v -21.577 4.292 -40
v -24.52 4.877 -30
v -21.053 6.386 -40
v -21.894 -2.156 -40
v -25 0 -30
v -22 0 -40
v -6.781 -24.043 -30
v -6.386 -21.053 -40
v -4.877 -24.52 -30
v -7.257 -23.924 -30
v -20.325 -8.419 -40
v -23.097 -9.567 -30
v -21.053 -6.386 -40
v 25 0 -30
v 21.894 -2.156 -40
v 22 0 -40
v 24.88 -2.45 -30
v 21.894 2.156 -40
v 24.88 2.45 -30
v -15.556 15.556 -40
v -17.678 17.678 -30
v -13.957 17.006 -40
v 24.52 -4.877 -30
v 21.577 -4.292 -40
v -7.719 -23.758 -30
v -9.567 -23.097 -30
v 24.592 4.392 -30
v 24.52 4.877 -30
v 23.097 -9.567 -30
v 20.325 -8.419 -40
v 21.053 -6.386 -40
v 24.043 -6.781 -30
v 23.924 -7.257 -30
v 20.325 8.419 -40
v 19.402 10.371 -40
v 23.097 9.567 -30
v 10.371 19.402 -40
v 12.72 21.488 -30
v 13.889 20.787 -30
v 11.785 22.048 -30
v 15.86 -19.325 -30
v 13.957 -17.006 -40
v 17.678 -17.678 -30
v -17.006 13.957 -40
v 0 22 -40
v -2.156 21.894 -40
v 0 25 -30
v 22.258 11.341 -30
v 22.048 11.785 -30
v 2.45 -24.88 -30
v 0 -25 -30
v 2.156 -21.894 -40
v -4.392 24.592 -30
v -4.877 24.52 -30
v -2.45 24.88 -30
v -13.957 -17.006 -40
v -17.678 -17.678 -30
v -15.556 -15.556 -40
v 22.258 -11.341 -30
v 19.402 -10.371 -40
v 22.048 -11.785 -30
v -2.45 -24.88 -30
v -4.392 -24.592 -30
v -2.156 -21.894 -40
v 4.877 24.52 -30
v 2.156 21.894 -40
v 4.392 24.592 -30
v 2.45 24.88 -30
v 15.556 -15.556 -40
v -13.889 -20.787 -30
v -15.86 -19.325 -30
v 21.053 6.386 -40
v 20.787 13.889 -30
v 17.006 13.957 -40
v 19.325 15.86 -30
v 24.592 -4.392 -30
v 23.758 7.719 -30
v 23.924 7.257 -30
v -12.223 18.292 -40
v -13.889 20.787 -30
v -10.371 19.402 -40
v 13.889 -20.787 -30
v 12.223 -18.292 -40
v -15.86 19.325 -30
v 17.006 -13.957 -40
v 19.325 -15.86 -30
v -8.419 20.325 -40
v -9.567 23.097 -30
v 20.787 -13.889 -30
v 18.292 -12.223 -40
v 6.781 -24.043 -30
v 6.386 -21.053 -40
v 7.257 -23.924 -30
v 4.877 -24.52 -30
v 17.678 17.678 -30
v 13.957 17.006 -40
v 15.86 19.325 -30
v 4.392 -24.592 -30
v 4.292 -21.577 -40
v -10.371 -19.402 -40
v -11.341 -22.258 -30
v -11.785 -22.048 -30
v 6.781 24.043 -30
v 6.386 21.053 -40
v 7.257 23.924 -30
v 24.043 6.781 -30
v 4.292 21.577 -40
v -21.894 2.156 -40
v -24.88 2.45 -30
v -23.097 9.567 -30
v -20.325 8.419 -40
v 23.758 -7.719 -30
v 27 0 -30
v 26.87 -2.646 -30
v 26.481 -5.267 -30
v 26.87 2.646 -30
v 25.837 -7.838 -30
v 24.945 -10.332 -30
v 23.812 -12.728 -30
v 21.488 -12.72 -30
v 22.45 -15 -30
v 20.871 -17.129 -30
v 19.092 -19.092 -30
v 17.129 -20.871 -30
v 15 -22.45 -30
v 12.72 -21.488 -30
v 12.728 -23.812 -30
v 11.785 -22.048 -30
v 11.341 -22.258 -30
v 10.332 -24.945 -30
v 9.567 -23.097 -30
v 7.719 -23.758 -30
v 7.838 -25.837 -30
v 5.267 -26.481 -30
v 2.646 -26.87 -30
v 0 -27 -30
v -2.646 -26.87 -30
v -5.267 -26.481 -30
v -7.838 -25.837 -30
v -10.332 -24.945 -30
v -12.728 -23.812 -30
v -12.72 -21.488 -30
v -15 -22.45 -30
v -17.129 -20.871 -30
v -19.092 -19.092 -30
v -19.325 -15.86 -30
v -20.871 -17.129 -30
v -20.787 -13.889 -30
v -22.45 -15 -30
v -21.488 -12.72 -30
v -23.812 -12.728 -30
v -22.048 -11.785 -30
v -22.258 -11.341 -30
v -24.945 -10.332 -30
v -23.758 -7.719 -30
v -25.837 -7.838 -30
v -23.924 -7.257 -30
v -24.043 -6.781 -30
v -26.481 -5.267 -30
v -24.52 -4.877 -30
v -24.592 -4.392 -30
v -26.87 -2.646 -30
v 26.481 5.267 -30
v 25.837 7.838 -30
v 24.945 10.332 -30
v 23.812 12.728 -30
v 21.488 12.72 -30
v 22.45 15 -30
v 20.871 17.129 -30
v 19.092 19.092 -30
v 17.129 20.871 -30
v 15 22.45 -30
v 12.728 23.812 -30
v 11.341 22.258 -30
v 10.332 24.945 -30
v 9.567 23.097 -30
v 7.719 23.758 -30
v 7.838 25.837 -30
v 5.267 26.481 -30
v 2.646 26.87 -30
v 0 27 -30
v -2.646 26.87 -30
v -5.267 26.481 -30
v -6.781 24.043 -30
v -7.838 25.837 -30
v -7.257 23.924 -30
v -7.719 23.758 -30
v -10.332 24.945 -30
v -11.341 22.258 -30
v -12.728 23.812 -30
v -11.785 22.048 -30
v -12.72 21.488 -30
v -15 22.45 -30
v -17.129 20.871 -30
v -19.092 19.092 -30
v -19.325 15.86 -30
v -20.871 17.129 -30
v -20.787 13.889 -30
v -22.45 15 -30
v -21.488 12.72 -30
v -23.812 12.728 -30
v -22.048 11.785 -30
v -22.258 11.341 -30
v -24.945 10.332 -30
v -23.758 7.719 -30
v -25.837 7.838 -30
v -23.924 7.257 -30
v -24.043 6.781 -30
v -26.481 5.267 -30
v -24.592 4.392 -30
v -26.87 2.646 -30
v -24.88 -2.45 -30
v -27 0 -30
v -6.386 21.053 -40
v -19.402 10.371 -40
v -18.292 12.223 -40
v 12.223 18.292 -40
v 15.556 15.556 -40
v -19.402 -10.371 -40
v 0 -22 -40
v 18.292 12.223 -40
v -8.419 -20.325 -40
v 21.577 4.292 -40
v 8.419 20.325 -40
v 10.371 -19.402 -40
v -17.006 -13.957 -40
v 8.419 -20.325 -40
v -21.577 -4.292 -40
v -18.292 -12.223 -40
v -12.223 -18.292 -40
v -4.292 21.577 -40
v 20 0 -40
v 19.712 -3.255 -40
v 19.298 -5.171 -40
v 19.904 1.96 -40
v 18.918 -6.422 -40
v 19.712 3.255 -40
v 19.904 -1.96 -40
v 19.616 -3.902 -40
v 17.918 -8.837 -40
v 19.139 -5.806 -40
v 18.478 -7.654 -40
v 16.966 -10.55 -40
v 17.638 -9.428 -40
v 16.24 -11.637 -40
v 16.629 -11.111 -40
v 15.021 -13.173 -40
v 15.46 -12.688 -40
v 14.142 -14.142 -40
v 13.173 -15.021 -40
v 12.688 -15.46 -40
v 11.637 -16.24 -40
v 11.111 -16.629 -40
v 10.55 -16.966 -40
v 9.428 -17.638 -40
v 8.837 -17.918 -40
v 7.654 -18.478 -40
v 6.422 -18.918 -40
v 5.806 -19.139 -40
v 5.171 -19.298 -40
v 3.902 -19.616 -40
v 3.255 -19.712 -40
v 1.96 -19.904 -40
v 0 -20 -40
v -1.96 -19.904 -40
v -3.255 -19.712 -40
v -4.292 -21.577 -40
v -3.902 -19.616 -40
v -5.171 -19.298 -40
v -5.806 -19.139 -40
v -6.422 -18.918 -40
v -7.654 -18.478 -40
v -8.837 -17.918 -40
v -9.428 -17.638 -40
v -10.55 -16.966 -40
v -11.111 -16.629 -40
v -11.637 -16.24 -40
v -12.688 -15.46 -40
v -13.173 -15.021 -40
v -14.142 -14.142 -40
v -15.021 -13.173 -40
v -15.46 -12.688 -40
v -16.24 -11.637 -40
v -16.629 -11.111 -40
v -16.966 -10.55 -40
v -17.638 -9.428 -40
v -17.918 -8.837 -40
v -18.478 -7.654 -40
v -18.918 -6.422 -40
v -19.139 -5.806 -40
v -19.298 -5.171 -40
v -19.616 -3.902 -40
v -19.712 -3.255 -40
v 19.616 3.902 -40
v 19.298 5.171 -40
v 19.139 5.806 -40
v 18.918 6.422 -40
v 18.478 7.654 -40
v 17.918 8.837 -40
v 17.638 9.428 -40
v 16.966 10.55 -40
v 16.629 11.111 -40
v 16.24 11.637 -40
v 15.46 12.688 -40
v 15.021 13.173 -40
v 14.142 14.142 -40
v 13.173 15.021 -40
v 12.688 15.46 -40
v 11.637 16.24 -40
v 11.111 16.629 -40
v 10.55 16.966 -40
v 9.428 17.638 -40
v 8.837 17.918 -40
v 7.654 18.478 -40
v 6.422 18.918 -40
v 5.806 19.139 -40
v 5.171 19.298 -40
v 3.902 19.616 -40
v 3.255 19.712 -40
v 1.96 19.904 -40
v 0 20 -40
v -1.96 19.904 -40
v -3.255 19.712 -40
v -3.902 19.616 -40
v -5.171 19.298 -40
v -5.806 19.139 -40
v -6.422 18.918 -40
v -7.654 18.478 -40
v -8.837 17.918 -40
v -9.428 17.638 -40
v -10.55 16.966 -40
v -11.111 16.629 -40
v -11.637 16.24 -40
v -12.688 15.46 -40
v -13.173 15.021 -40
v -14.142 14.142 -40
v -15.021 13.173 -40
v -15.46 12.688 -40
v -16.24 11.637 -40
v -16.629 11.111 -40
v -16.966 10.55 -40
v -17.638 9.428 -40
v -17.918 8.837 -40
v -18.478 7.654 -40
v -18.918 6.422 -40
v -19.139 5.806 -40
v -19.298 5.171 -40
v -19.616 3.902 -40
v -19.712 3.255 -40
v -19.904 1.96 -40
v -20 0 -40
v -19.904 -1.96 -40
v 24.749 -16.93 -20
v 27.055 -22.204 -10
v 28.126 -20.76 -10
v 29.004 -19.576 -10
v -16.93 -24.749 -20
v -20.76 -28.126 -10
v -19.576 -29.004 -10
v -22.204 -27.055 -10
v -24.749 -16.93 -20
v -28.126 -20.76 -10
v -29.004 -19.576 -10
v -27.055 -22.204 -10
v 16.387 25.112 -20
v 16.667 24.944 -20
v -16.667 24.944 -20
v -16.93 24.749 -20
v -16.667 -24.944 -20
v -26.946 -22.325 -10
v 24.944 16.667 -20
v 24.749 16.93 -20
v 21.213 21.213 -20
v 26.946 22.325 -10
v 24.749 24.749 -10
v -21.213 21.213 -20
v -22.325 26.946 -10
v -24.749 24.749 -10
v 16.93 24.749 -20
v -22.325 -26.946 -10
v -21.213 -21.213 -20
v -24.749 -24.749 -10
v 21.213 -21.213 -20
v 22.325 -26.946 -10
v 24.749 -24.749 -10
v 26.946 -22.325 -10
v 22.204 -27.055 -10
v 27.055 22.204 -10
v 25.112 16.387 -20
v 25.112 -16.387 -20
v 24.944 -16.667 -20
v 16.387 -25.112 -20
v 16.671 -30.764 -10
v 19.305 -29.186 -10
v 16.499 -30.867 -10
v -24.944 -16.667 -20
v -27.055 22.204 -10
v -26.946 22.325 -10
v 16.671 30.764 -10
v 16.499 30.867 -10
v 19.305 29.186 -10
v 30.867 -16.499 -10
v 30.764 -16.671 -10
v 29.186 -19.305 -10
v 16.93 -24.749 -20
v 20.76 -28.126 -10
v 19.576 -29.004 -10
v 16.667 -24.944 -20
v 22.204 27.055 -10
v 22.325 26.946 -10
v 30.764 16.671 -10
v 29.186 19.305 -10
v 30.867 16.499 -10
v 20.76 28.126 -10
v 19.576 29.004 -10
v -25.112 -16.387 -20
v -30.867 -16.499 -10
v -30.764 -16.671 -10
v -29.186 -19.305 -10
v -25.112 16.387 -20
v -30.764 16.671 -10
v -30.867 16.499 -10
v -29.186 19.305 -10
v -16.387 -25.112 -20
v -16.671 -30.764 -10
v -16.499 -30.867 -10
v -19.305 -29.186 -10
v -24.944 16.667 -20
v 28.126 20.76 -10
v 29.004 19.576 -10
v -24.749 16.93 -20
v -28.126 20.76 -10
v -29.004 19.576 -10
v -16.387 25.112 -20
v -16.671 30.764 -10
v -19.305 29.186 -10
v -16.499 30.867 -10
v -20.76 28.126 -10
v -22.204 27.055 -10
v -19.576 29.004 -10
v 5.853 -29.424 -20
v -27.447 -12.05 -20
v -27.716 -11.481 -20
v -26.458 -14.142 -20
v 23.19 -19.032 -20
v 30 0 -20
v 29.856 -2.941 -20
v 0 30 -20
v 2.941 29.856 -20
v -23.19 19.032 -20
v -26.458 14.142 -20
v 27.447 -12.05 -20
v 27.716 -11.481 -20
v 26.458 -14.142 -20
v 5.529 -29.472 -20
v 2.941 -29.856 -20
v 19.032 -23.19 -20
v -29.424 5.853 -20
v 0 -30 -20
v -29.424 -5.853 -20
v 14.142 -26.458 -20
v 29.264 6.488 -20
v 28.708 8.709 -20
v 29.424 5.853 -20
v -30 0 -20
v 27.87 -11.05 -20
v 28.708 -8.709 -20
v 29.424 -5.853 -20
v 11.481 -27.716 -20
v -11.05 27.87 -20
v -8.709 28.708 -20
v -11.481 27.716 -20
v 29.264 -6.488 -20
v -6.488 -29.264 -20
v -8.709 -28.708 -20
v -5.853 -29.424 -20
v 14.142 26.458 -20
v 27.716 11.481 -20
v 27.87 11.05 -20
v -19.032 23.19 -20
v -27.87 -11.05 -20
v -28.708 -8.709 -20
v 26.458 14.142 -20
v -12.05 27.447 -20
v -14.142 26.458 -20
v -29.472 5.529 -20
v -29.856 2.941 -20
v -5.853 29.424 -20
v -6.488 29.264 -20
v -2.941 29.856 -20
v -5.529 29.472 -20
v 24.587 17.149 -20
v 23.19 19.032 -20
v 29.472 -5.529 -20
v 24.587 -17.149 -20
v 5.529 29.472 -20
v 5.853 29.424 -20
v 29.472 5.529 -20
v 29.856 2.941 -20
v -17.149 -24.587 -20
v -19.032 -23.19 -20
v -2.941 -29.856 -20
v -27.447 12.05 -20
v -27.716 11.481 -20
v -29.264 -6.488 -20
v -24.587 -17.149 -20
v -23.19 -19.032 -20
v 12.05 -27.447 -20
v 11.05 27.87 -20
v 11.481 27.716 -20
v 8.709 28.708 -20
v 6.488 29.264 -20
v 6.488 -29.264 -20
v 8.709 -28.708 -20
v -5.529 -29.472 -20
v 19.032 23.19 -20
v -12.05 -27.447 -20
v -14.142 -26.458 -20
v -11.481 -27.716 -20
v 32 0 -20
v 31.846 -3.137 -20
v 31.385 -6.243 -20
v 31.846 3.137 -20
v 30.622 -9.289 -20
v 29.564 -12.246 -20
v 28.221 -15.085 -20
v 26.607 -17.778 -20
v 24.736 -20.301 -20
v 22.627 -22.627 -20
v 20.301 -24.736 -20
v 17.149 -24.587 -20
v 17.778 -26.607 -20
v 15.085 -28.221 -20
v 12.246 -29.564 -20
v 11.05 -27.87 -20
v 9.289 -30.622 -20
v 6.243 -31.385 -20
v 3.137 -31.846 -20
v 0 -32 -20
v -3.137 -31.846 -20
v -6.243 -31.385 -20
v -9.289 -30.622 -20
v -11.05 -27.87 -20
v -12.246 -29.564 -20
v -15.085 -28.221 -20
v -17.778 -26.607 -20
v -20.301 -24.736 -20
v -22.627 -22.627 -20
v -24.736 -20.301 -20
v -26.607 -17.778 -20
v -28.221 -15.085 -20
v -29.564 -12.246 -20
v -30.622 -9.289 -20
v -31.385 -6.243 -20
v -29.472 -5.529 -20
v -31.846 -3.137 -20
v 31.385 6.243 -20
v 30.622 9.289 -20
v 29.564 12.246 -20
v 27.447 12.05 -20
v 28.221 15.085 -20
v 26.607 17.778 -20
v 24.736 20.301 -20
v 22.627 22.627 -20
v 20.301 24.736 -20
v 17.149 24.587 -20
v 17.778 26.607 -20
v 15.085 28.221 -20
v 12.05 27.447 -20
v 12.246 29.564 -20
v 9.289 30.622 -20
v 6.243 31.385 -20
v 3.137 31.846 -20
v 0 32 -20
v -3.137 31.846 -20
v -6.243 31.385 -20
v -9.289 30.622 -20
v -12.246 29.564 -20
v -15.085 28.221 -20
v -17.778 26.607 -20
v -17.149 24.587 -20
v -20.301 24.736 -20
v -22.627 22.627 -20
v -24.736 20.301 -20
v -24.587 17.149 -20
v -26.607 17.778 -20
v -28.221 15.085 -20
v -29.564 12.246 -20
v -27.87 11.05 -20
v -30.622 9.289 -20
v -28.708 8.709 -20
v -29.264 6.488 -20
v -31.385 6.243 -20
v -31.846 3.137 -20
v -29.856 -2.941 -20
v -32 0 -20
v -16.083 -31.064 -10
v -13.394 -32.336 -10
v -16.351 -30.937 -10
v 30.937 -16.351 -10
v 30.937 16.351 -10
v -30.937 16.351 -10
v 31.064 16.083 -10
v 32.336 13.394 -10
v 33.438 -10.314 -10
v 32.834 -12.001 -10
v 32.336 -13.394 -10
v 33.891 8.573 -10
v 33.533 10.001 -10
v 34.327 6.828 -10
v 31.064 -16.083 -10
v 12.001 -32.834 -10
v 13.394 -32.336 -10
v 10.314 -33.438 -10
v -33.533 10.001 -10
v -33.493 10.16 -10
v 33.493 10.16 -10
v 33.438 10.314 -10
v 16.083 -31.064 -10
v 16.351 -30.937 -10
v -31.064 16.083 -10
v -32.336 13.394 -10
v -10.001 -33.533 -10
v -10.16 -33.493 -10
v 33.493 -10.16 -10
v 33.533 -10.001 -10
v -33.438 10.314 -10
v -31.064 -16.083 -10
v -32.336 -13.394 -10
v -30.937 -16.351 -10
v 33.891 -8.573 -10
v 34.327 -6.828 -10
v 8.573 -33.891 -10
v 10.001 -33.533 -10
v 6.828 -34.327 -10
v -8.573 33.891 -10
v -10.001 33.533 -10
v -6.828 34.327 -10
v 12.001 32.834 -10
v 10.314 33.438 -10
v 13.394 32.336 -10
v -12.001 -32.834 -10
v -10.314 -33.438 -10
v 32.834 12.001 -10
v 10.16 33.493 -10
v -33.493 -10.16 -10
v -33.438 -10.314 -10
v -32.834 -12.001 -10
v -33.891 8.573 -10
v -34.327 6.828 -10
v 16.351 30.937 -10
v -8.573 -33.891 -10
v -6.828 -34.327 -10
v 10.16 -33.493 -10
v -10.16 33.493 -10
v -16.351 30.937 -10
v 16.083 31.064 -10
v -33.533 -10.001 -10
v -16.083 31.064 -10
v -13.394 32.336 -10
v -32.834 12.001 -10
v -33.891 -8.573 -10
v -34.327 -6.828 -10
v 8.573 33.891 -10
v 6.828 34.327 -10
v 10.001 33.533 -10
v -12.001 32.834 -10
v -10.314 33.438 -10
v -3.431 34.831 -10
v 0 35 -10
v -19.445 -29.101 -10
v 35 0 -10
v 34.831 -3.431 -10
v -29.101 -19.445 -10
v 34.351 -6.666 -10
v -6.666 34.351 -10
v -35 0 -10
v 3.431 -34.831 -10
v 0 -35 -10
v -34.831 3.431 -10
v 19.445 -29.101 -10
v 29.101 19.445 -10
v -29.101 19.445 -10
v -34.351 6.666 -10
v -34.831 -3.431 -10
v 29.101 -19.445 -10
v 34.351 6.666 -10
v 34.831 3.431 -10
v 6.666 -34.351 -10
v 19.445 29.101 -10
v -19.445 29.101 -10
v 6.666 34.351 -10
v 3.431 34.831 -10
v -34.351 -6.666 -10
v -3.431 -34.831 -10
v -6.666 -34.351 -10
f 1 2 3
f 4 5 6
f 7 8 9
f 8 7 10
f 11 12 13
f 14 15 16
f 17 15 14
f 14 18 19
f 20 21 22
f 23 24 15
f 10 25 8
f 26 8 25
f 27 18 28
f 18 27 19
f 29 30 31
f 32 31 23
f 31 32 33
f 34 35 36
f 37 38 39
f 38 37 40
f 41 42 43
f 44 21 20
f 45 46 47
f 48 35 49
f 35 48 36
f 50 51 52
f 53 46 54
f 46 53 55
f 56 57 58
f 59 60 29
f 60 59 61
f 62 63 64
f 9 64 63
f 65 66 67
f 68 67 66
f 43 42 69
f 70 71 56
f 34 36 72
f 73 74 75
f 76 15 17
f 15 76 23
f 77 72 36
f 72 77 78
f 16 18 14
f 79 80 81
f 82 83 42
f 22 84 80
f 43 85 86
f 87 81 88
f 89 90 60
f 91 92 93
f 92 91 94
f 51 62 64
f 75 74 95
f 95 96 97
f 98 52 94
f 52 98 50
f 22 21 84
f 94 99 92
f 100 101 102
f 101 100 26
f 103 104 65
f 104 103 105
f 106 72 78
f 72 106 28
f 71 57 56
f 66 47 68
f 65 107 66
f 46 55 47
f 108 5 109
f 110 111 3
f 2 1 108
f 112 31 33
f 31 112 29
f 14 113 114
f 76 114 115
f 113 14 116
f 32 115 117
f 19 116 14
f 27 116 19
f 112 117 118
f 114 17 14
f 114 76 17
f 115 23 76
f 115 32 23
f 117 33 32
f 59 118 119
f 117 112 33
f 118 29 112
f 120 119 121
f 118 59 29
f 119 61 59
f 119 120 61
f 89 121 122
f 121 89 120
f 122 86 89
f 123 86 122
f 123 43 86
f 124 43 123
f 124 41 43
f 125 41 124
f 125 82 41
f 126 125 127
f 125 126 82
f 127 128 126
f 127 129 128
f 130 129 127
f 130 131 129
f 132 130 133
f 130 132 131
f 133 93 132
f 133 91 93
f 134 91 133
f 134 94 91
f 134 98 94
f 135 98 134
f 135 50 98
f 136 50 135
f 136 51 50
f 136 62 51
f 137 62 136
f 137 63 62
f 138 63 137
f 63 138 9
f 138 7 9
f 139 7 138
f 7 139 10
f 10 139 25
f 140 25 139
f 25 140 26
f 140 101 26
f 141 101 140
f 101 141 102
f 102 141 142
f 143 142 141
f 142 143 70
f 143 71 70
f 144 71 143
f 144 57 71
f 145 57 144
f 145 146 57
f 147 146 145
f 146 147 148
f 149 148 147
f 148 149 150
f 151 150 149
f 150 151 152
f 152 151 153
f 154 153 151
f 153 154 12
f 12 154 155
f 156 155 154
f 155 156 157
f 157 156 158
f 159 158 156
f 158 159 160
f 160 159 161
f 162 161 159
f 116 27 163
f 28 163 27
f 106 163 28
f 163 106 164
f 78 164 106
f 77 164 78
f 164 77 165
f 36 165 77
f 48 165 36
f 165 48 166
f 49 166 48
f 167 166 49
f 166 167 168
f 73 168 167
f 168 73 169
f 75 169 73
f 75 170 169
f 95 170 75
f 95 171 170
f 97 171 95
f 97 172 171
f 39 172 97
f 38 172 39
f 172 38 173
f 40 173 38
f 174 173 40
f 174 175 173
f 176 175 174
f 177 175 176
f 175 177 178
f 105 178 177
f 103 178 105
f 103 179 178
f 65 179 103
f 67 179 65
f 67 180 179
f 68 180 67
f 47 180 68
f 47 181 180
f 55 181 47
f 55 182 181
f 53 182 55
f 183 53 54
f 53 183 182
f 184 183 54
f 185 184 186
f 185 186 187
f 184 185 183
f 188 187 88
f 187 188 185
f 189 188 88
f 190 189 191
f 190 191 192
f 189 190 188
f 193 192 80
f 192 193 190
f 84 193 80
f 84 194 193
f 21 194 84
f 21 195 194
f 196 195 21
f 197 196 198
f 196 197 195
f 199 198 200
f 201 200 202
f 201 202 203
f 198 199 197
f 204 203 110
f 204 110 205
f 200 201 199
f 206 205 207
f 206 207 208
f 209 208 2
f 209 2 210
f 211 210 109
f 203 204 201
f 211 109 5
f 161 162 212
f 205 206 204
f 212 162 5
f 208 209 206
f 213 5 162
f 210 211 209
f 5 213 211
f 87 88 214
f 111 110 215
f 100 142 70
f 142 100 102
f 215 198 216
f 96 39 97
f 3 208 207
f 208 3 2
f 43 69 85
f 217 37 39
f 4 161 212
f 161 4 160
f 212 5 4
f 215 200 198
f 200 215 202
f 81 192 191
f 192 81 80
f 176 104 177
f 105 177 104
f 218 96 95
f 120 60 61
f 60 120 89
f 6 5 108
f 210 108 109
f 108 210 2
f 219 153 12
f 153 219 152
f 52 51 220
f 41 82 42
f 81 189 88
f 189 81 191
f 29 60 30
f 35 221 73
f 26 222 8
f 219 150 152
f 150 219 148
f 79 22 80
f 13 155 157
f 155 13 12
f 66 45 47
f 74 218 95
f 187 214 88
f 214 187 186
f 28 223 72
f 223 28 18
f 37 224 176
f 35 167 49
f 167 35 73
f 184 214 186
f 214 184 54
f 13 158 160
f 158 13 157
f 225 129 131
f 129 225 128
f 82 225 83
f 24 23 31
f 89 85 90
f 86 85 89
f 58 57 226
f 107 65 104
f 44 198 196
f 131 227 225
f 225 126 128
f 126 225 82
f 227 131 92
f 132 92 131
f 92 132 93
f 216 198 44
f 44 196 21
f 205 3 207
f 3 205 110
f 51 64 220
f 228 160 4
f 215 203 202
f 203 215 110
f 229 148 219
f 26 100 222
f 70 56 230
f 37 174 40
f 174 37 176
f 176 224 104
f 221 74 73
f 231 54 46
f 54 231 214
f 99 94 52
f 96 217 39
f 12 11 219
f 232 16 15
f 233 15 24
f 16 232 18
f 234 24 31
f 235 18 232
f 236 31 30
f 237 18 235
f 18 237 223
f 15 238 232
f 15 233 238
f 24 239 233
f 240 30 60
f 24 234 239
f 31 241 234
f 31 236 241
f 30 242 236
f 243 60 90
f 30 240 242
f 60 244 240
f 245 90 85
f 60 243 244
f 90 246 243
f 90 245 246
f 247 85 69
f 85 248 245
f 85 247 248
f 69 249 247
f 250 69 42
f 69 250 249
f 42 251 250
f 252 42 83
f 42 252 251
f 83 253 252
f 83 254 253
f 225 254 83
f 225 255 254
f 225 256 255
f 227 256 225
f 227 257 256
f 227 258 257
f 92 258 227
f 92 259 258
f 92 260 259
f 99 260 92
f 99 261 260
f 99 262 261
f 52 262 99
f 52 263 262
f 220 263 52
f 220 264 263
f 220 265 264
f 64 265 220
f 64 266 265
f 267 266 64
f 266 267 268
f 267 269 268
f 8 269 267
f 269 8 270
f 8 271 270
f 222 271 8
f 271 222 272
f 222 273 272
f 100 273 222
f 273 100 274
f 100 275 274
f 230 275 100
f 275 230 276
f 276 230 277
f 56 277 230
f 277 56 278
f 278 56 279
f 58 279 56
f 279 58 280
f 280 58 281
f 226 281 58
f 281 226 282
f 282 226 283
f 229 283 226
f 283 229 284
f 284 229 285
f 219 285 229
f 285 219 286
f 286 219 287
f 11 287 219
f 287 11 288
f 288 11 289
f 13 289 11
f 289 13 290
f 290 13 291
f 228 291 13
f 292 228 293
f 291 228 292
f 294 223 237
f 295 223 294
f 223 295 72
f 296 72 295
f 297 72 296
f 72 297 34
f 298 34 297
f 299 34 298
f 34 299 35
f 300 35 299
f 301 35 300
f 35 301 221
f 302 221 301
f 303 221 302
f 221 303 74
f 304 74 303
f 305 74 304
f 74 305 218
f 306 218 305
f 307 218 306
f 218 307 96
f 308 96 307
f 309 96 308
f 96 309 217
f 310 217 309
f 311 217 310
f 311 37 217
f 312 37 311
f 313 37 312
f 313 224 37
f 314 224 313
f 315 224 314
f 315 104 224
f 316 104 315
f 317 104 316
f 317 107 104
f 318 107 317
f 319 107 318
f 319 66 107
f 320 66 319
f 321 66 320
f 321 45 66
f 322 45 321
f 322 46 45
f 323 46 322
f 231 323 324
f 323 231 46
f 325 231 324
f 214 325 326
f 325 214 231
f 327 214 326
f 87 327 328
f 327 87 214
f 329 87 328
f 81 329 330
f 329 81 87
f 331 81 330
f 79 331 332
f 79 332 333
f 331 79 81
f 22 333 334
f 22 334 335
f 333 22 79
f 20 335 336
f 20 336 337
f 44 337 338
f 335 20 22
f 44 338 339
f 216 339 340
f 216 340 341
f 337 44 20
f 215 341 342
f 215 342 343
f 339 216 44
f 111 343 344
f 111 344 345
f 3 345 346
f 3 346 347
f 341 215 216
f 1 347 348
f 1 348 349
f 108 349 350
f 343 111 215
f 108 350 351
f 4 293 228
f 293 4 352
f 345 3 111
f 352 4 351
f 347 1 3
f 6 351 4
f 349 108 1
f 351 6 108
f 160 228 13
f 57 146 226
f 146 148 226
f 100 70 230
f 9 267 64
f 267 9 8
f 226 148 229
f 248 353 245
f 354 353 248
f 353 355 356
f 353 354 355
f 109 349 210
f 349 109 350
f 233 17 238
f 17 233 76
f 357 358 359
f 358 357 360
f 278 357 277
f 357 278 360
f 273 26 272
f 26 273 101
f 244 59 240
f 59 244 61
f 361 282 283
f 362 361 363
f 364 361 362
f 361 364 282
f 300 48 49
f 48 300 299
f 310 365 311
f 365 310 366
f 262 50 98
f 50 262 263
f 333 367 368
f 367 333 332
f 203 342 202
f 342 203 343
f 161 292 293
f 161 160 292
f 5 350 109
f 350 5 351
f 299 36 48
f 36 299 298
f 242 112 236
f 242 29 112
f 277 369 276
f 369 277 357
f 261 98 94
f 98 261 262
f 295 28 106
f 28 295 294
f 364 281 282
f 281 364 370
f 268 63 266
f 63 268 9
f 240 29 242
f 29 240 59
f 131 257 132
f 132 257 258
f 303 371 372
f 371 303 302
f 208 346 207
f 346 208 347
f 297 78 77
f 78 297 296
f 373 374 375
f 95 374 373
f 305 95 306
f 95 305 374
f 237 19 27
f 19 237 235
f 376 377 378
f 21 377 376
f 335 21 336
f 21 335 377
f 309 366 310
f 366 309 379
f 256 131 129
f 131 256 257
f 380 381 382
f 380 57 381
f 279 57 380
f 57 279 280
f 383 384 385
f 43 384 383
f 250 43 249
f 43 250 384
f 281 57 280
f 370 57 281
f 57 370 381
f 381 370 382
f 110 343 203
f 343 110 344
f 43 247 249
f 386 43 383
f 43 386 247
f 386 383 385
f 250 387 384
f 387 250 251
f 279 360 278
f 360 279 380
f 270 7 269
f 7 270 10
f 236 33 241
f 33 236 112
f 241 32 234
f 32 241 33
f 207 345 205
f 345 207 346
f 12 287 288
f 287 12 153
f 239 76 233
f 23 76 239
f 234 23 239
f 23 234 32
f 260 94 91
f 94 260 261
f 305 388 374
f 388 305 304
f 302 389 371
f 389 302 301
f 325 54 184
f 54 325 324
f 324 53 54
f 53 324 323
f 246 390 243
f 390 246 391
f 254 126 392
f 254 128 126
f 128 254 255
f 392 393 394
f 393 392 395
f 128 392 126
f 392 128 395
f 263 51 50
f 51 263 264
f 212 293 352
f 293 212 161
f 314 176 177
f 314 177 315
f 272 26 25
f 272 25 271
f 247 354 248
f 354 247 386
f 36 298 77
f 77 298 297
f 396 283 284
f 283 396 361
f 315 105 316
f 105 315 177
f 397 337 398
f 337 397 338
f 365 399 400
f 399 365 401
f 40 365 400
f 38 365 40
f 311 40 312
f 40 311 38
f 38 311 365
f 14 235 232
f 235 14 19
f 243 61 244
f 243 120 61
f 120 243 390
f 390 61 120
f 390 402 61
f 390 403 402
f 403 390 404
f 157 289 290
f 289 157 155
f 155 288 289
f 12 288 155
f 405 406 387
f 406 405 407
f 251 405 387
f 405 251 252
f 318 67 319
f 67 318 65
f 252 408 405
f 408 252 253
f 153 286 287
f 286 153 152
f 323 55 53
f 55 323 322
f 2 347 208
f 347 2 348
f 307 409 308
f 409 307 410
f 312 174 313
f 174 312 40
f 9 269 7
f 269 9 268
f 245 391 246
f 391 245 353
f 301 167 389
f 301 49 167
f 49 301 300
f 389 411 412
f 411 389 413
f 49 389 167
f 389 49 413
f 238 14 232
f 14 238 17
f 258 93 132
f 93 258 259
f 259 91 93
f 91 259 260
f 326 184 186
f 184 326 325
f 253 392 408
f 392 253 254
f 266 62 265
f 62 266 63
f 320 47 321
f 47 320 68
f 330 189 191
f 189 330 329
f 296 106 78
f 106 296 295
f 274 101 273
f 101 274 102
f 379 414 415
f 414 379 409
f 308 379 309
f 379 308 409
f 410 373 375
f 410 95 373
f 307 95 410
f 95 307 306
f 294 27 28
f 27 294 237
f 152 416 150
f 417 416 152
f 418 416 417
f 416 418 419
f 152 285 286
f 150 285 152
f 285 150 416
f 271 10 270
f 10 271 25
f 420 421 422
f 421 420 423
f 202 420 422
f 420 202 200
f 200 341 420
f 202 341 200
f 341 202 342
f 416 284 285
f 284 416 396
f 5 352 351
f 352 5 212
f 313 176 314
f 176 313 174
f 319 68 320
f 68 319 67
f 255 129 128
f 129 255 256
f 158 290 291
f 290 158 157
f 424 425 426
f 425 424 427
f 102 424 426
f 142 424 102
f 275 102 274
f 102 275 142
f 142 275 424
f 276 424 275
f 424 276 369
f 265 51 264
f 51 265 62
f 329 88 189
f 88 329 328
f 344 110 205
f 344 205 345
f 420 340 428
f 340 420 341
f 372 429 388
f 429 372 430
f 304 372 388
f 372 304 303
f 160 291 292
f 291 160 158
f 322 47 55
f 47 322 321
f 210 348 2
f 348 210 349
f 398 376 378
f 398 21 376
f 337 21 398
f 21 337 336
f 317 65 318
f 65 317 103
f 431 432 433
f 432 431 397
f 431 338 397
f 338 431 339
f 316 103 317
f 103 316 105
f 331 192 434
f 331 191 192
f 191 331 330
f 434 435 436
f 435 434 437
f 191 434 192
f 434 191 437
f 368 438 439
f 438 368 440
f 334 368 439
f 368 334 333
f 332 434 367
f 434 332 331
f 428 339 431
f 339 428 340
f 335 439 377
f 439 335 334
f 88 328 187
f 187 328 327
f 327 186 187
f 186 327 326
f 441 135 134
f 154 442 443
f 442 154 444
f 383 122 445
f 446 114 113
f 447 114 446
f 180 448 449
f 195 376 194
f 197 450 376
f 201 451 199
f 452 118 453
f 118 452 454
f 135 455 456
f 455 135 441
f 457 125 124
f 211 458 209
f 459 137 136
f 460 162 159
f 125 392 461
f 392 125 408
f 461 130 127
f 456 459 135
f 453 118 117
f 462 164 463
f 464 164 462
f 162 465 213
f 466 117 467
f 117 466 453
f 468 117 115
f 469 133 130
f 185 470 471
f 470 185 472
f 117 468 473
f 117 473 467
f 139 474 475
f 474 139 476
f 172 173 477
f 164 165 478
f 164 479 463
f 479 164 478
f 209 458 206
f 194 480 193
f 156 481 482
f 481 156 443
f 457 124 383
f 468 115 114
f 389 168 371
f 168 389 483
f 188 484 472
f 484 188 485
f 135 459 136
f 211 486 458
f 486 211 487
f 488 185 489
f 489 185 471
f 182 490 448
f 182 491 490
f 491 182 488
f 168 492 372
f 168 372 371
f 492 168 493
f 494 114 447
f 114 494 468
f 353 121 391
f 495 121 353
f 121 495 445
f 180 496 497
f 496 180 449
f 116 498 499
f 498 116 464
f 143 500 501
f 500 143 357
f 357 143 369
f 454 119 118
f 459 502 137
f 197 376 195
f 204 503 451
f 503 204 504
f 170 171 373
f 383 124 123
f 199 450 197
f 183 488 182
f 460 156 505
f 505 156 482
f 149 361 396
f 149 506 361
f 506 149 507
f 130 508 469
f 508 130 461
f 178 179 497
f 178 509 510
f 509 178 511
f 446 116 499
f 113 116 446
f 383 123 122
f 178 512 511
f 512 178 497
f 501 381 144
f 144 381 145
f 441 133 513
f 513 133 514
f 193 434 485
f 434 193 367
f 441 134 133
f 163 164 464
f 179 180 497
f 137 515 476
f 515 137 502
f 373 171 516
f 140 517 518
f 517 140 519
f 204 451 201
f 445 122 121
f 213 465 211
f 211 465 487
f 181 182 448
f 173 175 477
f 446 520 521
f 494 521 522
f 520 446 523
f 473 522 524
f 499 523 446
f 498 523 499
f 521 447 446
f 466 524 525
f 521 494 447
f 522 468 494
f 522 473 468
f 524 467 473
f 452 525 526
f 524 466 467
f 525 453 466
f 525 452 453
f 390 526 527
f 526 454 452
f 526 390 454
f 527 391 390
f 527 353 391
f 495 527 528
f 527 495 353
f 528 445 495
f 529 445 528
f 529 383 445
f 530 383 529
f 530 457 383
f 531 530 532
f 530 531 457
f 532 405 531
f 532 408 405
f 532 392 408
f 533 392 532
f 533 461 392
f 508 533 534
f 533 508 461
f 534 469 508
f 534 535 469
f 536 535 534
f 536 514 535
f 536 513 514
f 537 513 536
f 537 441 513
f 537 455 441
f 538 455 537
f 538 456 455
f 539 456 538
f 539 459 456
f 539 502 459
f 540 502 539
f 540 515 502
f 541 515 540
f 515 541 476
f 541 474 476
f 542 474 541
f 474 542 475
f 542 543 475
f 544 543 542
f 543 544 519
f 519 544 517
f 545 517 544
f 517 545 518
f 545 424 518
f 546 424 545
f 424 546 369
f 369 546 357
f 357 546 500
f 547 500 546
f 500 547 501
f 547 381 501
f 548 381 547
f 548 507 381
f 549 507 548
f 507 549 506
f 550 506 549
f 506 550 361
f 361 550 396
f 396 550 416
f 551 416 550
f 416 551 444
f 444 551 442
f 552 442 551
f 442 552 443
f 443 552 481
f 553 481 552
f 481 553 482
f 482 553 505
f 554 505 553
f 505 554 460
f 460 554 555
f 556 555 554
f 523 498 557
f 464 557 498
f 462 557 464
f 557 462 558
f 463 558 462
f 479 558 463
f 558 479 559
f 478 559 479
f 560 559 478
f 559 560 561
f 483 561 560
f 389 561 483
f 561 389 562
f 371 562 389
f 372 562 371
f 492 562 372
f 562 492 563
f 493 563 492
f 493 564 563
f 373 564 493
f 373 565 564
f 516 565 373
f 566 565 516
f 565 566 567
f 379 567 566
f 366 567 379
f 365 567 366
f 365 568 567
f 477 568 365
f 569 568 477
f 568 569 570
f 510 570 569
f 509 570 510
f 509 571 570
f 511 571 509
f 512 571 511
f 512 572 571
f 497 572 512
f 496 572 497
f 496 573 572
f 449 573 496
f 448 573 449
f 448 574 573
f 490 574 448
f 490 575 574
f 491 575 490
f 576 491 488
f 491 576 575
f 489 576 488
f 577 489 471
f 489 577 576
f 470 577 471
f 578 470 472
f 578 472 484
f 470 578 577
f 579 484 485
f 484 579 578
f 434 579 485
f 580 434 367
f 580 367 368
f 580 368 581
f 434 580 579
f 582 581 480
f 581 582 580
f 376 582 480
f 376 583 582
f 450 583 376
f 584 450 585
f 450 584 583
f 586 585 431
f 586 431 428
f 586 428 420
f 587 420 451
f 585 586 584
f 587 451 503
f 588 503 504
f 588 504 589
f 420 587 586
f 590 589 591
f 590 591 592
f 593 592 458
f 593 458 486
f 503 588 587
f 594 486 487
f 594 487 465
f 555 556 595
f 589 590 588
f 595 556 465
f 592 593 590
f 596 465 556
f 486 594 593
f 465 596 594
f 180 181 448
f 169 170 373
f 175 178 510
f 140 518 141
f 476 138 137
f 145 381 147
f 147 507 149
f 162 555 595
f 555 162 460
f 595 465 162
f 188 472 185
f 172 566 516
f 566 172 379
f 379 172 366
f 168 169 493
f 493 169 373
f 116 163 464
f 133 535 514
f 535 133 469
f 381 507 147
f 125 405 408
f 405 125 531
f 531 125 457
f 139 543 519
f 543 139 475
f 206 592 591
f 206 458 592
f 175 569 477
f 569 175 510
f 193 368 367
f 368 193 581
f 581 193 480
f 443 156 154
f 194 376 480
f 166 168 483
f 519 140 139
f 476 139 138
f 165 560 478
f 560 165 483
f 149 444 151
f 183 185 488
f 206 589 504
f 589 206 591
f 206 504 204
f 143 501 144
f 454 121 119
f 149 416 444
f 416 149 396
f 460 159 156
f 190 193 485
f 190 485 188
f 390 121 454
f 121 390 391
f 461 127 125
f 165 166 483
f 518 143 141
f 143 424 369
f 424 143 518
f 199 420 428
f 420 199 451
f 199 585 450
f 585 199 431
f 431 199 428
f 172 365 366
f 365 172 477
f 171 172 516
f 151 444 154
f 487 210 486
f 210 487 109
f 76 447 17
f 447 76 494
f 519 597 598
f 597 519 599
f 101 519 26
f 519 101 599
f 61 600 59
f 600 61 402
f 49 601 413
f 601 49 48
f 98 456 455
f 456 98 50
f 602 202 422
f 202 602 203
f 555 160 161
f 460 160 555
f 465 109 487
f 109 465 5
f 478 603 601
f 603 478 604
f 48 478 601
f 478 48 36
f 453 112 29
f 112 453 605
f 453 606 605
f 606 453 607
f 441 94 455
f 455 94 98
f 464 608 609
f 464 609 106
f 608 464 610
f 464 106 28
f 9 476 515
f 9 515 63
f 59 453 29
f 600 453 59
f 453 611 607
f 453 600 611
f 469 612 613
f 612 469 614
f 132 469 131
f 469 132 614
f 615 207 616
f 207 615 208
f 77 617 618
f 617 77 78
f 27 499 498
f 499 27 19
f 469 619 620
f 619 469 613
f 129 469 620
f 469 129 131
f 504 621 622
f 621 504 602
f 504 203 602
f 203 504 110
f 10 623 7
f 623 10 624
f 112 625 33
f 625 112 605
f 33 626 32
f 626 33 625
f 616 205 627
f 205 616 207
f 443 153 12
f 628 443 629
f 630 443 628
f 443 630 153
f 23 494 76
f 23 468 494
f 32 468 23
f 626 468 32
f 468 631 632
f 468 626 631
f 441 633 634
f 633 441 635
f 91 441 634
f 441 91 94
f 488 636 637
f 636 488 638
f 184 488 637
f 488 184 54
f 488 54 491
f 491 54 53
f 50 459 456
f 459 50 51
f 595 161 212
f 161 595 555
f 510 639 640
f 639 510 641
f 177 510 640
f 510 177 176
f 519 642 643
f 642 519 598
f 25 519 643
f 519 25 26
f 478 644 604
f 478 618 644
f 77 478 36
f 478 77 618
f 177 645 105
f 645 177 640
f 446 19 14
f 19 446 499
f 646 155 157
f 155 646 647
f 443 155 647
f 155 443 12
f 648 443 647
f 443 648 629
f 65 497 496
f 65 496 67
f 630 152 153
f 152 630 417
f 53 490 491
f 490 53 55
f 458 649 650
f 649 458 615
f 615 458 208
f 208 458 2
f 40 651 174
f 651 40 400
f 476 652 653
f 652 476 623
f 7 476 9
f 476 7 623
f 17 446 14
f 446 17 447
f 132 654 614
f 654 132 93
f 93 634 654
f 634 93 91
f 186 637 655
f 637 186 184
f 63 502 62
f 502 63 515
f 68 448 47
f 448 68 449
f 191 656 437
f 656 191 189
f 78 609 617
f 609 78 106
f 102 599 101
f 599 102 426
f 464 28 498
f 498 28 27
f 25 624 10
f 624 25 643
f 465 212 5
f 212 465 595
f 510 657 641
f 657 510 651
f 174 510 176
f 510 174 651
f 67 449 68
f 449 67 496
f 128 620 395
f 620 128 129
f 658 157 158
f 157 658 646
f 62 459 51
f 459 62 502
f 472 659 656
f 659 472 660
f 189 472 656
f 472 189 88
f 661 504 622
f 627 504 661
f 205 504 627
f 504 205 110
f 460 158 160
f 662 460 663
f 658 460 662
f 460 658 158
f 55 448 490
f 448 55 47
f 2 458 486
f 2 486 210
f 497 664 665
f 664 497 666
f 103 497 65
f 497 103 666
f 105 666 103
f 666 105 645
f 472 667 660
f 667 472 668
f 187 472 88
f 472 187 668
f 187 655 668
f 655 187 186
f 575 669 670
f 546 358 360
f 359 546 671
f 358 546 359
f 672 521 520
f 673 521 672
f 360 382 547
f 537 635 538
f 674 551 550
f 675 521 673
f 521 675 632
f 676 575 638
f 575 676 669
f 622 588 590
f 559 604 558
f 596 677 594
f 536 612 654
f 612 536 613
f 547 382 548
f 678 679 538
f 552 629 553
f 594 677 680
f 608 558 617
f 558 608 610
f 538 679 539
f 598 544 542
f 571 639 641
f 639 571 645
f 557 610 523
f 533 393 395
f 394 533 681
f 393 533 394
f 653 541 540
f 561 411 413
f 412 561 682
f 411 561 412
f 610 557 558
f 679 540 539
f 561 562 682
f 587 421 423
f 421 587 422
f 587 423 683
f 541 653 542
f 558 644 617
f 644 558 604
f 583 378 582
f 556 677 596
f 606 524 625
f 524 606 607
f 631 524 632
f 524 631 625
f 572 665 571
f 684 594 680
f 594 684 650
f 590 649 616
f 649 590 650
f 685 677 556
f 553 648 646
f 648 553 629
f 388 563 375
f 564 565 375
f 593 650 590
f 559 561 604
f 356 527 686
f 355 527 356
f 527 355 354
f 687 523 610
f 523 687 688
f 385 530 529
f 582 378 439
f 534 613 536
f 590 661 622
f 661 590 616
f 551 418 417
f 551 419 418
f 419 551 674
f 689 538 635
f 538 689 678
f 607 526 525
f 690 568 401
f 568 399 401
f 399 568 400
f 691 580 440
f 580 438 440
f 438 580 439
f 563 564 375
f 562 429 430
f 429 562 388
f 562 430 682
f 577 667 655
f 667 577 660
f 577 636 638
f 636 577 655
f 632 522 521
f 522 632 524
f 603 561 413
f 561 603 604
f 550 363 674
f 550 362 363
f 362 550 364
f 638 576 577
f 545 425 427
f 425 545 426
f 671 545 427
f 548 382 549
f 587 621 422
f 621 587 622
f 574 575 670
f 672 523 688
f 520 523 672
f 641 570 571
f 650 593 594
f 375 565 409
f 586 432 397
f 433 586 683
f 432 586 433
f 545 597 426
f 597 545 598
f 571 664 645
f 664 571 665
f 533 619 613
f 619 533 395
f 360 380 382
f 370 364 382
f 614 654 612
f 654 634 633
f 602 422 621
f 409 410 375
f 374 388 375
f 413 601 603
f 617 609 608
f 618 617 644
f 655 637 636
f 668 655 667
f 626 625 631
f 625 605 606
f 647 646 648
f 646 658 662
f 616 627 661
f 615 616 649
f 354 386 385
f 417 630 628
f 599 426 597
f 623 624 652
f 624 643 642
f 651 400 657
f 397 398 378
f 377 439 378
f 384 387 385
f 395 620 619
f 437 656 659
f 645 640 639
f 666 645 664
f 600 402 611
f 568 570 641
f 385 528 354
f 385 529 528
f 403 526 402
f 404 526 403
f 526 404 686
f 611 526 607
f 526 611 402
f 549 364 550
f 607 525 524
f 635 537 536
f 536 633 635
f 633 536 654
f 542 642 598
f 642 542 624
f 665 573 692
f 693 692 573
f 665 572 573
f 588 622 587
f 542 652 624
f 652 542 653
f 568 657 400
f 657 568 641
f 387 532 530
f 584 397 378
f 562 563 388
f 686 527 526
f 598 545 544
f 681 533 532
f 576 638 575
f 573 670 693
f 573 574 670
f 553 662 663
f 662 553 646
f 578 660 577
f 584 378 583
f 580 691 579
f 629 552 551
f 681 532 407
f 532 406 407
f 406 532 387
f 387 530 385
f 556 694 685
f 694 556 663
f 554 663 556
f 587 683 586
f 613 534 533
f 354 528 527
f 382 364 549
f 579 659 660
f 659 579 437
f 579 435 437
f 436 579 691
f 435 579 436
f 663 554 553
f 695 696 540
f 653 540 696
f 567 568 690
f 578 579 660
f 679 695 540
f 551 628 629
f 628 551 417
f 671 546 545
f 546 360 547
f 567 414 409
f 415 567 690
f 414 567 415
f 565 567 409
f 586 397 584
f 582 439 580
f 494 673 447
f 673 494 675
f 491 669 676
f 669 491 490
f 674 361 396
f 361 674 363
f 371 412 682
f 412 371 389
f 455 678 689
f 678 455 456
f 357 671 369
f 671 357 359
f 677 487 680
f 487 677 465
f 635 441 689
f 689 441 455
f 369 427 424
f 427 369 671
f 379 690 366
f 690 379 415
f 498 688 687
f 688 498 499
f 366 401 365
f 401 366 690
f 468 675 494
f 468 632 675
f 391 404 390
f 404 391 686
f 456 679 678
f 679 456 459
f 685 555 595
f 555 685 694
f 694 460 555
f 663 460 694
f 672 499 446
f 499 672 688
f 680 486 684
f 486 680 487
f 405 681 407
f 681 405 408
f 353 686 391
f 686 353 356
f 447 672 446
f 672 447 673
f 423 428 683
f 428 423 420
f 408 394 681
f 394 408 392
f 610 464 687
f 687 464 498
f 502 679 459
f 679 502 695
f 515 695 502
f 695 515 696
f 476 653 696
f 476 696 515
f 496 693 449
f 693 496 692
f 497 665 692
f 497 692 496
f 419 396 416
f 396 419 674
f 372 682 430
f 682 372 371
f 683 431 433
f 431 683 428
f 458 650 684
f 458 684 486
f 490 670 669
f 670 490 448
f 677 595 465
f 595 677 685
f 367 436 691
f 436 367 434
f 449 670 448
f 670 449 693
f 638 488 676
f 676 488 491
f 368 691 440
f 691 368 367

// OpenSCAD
// Start: lazy_union
part1_2_mat2_5();
part0_1_mat1_5_cured();
part0_0_mat0_5_cured();
// End: lazy_union

// Modules.

// 'PartMaterial part0 0 - mat0 5.0'
module part0_0_mat0_5() {
  // 'None : _combine_solids_and_holes'
  union() {
    // '_combine_solids_and_holes'
    difference() {
      // 'default : _combine_solids_and_holes'
      union() {
        // ('ext', 0)
        multmatrix(m=[[1.0, 0.0, 0.0, 0.0], [0.0, -1.0, 0.0, 0.0], [0.0, 0.0, -1.0, -10.0], [0.0, 0.0, 0.0, 1.0]]) {
          // ('ext', 0)
          color(c=[1.0, 0.25, 0.2, 0.7]) {
            // "('ext', 0) : _combine_solids_and_holes"
            union() {
              // ('ext', 0)
              cylinder(h=10.0, r1=35.0, r2=32.0, center=false, $fn=64);
            }
          }
        }
      }
      // 'default'
      multmatrix(m=[[1.0, 0.0, 0.0, 0.0], [-0.0, -1.0, -0.0, -0.0], [-0.0, -0.0, -1.0, -0.0], [0.0, 0.0, 0.0, 1.0]]) {
        // 'master : _combine_solids_and_holes'
        union() {
          // 'master'
          cylinder(h=60.0, r1=40.0, r2=10.0, center=false, $fn=64);
        }
      }
    }
  }
} // end module part0_0_mat0_5

// 'PartMaterial part0 0 - mat0 5.0'
module part0_0_mat0_5_cured() {
  difference() {
    part0_0_mat0_5();
    // "cured PartMaterial(part=Part(name='part0', priority=0), material=Material(name='mat0', priority=5.0, kind=MaterialKind(physical=True)))"
    union() {
      part1_2_mat2_5();
      part0_1_mat1_5();
    }
  }
} // end module part0_0_mat0_5_cured

// 'PartMaterial part0 1 - mat1 5.0'
module part0_1_mat1_5() {
  // 'None : _combine_solids_and_holes'
  union() {
    // '_combine_solids_and_holes'
    difference() {
      // 'default : _combine_solids_and_holes'
      union() {
        // ('ext', 1)
        multmatrix(m=[[1.0, 0.0, 0.0, 0.0], [0.0, -1.0, 0.0, 0.0], [0.0, 0.0, -1.0, -20.0], [0.0, 0.0, 0.0, 1.0]]) {
          // ('ext', 1)
          color(c=[1.0, 0.5, 0.2, 0.7]) {
            // "('ext', 1) : _combine_solids_and_holes"
            union() {
              // ('ext', 1)
              cylinder(h=10.0, r1=30.0, r2=27.0, center=false, $fn=64);
            }
          }
        }
      }
      // 'default'
      multmatrix(m=[[1.0, 0.0, 0.0, 0.0], [-0.0, -1.0, -0.0, -0.0], [-0.0, -0.0, -1.0, -0.0], [0.0, 0.0, 0.0, 1.0]]) {
        // 'master : _combine_solids_and_holes'
        union() {
          // 'master'
          cylinder(h=60.0, r1=40.0, r2=10.0, center=false, $fn=64);
        }
      }
    }
  }
} // end module part0_1_mat1_5

// 'PartMaterial part0 1 - mat1 5.0'
module part0_1_mat1_5_cured() {
  difference() {
    part0_1_mat1_5();
    part1_2_mat2_5();
  }
} // end module part0_1_mat1_5_cured

// 'PartMaterial part1 2 - mat2 5.0'
module part1_2_mat2_5() {
  // 'None : _combine_solids_and_holes'
  union() {
    // '_combine_solids_and_holes'
    difference() {
      // 'default : _combine_solids_and_holes'
      union() {
        // ('ext', 2)
        multmatrix(m=[[1.0, 0.0, 0.0, 0.0], [0.0, -1.0, 0.0, 0.0], [0.0, 0.0, -1.0, -30.0], [0.0, 0.0, 0.0, 1.0]]) {
          // ('ext', 2)
          color(c=[1.0, 0.75, 0.2, 0.7]) {
            // "('ext', 2) : _combine_solids_and_holes"
            union() {
              // ('ext', 2)
              cylinder(h=10.0, r1=25.0, r2=22.0, center=false, $fn=64);
            }
          }
        }
      }
      // 'default'
      multmatrix(m=[[1.0, 0.0, 0.0, 0.0], [-0.0, -1.0, -0.0, -0.0], [-0.0, -0.0, -1.0, -0.0], [0.0, 0.0, 0.0, 1.0]]) {
        // 'master : _combine_solids_and_holes'
        union() {
          // 'master'
          cylinder(h=60.0, r1=40.0, r2=10.0, center=false, $fn=64);
        }
      }
    }
  }
} // end module part1_2_mat2_5
